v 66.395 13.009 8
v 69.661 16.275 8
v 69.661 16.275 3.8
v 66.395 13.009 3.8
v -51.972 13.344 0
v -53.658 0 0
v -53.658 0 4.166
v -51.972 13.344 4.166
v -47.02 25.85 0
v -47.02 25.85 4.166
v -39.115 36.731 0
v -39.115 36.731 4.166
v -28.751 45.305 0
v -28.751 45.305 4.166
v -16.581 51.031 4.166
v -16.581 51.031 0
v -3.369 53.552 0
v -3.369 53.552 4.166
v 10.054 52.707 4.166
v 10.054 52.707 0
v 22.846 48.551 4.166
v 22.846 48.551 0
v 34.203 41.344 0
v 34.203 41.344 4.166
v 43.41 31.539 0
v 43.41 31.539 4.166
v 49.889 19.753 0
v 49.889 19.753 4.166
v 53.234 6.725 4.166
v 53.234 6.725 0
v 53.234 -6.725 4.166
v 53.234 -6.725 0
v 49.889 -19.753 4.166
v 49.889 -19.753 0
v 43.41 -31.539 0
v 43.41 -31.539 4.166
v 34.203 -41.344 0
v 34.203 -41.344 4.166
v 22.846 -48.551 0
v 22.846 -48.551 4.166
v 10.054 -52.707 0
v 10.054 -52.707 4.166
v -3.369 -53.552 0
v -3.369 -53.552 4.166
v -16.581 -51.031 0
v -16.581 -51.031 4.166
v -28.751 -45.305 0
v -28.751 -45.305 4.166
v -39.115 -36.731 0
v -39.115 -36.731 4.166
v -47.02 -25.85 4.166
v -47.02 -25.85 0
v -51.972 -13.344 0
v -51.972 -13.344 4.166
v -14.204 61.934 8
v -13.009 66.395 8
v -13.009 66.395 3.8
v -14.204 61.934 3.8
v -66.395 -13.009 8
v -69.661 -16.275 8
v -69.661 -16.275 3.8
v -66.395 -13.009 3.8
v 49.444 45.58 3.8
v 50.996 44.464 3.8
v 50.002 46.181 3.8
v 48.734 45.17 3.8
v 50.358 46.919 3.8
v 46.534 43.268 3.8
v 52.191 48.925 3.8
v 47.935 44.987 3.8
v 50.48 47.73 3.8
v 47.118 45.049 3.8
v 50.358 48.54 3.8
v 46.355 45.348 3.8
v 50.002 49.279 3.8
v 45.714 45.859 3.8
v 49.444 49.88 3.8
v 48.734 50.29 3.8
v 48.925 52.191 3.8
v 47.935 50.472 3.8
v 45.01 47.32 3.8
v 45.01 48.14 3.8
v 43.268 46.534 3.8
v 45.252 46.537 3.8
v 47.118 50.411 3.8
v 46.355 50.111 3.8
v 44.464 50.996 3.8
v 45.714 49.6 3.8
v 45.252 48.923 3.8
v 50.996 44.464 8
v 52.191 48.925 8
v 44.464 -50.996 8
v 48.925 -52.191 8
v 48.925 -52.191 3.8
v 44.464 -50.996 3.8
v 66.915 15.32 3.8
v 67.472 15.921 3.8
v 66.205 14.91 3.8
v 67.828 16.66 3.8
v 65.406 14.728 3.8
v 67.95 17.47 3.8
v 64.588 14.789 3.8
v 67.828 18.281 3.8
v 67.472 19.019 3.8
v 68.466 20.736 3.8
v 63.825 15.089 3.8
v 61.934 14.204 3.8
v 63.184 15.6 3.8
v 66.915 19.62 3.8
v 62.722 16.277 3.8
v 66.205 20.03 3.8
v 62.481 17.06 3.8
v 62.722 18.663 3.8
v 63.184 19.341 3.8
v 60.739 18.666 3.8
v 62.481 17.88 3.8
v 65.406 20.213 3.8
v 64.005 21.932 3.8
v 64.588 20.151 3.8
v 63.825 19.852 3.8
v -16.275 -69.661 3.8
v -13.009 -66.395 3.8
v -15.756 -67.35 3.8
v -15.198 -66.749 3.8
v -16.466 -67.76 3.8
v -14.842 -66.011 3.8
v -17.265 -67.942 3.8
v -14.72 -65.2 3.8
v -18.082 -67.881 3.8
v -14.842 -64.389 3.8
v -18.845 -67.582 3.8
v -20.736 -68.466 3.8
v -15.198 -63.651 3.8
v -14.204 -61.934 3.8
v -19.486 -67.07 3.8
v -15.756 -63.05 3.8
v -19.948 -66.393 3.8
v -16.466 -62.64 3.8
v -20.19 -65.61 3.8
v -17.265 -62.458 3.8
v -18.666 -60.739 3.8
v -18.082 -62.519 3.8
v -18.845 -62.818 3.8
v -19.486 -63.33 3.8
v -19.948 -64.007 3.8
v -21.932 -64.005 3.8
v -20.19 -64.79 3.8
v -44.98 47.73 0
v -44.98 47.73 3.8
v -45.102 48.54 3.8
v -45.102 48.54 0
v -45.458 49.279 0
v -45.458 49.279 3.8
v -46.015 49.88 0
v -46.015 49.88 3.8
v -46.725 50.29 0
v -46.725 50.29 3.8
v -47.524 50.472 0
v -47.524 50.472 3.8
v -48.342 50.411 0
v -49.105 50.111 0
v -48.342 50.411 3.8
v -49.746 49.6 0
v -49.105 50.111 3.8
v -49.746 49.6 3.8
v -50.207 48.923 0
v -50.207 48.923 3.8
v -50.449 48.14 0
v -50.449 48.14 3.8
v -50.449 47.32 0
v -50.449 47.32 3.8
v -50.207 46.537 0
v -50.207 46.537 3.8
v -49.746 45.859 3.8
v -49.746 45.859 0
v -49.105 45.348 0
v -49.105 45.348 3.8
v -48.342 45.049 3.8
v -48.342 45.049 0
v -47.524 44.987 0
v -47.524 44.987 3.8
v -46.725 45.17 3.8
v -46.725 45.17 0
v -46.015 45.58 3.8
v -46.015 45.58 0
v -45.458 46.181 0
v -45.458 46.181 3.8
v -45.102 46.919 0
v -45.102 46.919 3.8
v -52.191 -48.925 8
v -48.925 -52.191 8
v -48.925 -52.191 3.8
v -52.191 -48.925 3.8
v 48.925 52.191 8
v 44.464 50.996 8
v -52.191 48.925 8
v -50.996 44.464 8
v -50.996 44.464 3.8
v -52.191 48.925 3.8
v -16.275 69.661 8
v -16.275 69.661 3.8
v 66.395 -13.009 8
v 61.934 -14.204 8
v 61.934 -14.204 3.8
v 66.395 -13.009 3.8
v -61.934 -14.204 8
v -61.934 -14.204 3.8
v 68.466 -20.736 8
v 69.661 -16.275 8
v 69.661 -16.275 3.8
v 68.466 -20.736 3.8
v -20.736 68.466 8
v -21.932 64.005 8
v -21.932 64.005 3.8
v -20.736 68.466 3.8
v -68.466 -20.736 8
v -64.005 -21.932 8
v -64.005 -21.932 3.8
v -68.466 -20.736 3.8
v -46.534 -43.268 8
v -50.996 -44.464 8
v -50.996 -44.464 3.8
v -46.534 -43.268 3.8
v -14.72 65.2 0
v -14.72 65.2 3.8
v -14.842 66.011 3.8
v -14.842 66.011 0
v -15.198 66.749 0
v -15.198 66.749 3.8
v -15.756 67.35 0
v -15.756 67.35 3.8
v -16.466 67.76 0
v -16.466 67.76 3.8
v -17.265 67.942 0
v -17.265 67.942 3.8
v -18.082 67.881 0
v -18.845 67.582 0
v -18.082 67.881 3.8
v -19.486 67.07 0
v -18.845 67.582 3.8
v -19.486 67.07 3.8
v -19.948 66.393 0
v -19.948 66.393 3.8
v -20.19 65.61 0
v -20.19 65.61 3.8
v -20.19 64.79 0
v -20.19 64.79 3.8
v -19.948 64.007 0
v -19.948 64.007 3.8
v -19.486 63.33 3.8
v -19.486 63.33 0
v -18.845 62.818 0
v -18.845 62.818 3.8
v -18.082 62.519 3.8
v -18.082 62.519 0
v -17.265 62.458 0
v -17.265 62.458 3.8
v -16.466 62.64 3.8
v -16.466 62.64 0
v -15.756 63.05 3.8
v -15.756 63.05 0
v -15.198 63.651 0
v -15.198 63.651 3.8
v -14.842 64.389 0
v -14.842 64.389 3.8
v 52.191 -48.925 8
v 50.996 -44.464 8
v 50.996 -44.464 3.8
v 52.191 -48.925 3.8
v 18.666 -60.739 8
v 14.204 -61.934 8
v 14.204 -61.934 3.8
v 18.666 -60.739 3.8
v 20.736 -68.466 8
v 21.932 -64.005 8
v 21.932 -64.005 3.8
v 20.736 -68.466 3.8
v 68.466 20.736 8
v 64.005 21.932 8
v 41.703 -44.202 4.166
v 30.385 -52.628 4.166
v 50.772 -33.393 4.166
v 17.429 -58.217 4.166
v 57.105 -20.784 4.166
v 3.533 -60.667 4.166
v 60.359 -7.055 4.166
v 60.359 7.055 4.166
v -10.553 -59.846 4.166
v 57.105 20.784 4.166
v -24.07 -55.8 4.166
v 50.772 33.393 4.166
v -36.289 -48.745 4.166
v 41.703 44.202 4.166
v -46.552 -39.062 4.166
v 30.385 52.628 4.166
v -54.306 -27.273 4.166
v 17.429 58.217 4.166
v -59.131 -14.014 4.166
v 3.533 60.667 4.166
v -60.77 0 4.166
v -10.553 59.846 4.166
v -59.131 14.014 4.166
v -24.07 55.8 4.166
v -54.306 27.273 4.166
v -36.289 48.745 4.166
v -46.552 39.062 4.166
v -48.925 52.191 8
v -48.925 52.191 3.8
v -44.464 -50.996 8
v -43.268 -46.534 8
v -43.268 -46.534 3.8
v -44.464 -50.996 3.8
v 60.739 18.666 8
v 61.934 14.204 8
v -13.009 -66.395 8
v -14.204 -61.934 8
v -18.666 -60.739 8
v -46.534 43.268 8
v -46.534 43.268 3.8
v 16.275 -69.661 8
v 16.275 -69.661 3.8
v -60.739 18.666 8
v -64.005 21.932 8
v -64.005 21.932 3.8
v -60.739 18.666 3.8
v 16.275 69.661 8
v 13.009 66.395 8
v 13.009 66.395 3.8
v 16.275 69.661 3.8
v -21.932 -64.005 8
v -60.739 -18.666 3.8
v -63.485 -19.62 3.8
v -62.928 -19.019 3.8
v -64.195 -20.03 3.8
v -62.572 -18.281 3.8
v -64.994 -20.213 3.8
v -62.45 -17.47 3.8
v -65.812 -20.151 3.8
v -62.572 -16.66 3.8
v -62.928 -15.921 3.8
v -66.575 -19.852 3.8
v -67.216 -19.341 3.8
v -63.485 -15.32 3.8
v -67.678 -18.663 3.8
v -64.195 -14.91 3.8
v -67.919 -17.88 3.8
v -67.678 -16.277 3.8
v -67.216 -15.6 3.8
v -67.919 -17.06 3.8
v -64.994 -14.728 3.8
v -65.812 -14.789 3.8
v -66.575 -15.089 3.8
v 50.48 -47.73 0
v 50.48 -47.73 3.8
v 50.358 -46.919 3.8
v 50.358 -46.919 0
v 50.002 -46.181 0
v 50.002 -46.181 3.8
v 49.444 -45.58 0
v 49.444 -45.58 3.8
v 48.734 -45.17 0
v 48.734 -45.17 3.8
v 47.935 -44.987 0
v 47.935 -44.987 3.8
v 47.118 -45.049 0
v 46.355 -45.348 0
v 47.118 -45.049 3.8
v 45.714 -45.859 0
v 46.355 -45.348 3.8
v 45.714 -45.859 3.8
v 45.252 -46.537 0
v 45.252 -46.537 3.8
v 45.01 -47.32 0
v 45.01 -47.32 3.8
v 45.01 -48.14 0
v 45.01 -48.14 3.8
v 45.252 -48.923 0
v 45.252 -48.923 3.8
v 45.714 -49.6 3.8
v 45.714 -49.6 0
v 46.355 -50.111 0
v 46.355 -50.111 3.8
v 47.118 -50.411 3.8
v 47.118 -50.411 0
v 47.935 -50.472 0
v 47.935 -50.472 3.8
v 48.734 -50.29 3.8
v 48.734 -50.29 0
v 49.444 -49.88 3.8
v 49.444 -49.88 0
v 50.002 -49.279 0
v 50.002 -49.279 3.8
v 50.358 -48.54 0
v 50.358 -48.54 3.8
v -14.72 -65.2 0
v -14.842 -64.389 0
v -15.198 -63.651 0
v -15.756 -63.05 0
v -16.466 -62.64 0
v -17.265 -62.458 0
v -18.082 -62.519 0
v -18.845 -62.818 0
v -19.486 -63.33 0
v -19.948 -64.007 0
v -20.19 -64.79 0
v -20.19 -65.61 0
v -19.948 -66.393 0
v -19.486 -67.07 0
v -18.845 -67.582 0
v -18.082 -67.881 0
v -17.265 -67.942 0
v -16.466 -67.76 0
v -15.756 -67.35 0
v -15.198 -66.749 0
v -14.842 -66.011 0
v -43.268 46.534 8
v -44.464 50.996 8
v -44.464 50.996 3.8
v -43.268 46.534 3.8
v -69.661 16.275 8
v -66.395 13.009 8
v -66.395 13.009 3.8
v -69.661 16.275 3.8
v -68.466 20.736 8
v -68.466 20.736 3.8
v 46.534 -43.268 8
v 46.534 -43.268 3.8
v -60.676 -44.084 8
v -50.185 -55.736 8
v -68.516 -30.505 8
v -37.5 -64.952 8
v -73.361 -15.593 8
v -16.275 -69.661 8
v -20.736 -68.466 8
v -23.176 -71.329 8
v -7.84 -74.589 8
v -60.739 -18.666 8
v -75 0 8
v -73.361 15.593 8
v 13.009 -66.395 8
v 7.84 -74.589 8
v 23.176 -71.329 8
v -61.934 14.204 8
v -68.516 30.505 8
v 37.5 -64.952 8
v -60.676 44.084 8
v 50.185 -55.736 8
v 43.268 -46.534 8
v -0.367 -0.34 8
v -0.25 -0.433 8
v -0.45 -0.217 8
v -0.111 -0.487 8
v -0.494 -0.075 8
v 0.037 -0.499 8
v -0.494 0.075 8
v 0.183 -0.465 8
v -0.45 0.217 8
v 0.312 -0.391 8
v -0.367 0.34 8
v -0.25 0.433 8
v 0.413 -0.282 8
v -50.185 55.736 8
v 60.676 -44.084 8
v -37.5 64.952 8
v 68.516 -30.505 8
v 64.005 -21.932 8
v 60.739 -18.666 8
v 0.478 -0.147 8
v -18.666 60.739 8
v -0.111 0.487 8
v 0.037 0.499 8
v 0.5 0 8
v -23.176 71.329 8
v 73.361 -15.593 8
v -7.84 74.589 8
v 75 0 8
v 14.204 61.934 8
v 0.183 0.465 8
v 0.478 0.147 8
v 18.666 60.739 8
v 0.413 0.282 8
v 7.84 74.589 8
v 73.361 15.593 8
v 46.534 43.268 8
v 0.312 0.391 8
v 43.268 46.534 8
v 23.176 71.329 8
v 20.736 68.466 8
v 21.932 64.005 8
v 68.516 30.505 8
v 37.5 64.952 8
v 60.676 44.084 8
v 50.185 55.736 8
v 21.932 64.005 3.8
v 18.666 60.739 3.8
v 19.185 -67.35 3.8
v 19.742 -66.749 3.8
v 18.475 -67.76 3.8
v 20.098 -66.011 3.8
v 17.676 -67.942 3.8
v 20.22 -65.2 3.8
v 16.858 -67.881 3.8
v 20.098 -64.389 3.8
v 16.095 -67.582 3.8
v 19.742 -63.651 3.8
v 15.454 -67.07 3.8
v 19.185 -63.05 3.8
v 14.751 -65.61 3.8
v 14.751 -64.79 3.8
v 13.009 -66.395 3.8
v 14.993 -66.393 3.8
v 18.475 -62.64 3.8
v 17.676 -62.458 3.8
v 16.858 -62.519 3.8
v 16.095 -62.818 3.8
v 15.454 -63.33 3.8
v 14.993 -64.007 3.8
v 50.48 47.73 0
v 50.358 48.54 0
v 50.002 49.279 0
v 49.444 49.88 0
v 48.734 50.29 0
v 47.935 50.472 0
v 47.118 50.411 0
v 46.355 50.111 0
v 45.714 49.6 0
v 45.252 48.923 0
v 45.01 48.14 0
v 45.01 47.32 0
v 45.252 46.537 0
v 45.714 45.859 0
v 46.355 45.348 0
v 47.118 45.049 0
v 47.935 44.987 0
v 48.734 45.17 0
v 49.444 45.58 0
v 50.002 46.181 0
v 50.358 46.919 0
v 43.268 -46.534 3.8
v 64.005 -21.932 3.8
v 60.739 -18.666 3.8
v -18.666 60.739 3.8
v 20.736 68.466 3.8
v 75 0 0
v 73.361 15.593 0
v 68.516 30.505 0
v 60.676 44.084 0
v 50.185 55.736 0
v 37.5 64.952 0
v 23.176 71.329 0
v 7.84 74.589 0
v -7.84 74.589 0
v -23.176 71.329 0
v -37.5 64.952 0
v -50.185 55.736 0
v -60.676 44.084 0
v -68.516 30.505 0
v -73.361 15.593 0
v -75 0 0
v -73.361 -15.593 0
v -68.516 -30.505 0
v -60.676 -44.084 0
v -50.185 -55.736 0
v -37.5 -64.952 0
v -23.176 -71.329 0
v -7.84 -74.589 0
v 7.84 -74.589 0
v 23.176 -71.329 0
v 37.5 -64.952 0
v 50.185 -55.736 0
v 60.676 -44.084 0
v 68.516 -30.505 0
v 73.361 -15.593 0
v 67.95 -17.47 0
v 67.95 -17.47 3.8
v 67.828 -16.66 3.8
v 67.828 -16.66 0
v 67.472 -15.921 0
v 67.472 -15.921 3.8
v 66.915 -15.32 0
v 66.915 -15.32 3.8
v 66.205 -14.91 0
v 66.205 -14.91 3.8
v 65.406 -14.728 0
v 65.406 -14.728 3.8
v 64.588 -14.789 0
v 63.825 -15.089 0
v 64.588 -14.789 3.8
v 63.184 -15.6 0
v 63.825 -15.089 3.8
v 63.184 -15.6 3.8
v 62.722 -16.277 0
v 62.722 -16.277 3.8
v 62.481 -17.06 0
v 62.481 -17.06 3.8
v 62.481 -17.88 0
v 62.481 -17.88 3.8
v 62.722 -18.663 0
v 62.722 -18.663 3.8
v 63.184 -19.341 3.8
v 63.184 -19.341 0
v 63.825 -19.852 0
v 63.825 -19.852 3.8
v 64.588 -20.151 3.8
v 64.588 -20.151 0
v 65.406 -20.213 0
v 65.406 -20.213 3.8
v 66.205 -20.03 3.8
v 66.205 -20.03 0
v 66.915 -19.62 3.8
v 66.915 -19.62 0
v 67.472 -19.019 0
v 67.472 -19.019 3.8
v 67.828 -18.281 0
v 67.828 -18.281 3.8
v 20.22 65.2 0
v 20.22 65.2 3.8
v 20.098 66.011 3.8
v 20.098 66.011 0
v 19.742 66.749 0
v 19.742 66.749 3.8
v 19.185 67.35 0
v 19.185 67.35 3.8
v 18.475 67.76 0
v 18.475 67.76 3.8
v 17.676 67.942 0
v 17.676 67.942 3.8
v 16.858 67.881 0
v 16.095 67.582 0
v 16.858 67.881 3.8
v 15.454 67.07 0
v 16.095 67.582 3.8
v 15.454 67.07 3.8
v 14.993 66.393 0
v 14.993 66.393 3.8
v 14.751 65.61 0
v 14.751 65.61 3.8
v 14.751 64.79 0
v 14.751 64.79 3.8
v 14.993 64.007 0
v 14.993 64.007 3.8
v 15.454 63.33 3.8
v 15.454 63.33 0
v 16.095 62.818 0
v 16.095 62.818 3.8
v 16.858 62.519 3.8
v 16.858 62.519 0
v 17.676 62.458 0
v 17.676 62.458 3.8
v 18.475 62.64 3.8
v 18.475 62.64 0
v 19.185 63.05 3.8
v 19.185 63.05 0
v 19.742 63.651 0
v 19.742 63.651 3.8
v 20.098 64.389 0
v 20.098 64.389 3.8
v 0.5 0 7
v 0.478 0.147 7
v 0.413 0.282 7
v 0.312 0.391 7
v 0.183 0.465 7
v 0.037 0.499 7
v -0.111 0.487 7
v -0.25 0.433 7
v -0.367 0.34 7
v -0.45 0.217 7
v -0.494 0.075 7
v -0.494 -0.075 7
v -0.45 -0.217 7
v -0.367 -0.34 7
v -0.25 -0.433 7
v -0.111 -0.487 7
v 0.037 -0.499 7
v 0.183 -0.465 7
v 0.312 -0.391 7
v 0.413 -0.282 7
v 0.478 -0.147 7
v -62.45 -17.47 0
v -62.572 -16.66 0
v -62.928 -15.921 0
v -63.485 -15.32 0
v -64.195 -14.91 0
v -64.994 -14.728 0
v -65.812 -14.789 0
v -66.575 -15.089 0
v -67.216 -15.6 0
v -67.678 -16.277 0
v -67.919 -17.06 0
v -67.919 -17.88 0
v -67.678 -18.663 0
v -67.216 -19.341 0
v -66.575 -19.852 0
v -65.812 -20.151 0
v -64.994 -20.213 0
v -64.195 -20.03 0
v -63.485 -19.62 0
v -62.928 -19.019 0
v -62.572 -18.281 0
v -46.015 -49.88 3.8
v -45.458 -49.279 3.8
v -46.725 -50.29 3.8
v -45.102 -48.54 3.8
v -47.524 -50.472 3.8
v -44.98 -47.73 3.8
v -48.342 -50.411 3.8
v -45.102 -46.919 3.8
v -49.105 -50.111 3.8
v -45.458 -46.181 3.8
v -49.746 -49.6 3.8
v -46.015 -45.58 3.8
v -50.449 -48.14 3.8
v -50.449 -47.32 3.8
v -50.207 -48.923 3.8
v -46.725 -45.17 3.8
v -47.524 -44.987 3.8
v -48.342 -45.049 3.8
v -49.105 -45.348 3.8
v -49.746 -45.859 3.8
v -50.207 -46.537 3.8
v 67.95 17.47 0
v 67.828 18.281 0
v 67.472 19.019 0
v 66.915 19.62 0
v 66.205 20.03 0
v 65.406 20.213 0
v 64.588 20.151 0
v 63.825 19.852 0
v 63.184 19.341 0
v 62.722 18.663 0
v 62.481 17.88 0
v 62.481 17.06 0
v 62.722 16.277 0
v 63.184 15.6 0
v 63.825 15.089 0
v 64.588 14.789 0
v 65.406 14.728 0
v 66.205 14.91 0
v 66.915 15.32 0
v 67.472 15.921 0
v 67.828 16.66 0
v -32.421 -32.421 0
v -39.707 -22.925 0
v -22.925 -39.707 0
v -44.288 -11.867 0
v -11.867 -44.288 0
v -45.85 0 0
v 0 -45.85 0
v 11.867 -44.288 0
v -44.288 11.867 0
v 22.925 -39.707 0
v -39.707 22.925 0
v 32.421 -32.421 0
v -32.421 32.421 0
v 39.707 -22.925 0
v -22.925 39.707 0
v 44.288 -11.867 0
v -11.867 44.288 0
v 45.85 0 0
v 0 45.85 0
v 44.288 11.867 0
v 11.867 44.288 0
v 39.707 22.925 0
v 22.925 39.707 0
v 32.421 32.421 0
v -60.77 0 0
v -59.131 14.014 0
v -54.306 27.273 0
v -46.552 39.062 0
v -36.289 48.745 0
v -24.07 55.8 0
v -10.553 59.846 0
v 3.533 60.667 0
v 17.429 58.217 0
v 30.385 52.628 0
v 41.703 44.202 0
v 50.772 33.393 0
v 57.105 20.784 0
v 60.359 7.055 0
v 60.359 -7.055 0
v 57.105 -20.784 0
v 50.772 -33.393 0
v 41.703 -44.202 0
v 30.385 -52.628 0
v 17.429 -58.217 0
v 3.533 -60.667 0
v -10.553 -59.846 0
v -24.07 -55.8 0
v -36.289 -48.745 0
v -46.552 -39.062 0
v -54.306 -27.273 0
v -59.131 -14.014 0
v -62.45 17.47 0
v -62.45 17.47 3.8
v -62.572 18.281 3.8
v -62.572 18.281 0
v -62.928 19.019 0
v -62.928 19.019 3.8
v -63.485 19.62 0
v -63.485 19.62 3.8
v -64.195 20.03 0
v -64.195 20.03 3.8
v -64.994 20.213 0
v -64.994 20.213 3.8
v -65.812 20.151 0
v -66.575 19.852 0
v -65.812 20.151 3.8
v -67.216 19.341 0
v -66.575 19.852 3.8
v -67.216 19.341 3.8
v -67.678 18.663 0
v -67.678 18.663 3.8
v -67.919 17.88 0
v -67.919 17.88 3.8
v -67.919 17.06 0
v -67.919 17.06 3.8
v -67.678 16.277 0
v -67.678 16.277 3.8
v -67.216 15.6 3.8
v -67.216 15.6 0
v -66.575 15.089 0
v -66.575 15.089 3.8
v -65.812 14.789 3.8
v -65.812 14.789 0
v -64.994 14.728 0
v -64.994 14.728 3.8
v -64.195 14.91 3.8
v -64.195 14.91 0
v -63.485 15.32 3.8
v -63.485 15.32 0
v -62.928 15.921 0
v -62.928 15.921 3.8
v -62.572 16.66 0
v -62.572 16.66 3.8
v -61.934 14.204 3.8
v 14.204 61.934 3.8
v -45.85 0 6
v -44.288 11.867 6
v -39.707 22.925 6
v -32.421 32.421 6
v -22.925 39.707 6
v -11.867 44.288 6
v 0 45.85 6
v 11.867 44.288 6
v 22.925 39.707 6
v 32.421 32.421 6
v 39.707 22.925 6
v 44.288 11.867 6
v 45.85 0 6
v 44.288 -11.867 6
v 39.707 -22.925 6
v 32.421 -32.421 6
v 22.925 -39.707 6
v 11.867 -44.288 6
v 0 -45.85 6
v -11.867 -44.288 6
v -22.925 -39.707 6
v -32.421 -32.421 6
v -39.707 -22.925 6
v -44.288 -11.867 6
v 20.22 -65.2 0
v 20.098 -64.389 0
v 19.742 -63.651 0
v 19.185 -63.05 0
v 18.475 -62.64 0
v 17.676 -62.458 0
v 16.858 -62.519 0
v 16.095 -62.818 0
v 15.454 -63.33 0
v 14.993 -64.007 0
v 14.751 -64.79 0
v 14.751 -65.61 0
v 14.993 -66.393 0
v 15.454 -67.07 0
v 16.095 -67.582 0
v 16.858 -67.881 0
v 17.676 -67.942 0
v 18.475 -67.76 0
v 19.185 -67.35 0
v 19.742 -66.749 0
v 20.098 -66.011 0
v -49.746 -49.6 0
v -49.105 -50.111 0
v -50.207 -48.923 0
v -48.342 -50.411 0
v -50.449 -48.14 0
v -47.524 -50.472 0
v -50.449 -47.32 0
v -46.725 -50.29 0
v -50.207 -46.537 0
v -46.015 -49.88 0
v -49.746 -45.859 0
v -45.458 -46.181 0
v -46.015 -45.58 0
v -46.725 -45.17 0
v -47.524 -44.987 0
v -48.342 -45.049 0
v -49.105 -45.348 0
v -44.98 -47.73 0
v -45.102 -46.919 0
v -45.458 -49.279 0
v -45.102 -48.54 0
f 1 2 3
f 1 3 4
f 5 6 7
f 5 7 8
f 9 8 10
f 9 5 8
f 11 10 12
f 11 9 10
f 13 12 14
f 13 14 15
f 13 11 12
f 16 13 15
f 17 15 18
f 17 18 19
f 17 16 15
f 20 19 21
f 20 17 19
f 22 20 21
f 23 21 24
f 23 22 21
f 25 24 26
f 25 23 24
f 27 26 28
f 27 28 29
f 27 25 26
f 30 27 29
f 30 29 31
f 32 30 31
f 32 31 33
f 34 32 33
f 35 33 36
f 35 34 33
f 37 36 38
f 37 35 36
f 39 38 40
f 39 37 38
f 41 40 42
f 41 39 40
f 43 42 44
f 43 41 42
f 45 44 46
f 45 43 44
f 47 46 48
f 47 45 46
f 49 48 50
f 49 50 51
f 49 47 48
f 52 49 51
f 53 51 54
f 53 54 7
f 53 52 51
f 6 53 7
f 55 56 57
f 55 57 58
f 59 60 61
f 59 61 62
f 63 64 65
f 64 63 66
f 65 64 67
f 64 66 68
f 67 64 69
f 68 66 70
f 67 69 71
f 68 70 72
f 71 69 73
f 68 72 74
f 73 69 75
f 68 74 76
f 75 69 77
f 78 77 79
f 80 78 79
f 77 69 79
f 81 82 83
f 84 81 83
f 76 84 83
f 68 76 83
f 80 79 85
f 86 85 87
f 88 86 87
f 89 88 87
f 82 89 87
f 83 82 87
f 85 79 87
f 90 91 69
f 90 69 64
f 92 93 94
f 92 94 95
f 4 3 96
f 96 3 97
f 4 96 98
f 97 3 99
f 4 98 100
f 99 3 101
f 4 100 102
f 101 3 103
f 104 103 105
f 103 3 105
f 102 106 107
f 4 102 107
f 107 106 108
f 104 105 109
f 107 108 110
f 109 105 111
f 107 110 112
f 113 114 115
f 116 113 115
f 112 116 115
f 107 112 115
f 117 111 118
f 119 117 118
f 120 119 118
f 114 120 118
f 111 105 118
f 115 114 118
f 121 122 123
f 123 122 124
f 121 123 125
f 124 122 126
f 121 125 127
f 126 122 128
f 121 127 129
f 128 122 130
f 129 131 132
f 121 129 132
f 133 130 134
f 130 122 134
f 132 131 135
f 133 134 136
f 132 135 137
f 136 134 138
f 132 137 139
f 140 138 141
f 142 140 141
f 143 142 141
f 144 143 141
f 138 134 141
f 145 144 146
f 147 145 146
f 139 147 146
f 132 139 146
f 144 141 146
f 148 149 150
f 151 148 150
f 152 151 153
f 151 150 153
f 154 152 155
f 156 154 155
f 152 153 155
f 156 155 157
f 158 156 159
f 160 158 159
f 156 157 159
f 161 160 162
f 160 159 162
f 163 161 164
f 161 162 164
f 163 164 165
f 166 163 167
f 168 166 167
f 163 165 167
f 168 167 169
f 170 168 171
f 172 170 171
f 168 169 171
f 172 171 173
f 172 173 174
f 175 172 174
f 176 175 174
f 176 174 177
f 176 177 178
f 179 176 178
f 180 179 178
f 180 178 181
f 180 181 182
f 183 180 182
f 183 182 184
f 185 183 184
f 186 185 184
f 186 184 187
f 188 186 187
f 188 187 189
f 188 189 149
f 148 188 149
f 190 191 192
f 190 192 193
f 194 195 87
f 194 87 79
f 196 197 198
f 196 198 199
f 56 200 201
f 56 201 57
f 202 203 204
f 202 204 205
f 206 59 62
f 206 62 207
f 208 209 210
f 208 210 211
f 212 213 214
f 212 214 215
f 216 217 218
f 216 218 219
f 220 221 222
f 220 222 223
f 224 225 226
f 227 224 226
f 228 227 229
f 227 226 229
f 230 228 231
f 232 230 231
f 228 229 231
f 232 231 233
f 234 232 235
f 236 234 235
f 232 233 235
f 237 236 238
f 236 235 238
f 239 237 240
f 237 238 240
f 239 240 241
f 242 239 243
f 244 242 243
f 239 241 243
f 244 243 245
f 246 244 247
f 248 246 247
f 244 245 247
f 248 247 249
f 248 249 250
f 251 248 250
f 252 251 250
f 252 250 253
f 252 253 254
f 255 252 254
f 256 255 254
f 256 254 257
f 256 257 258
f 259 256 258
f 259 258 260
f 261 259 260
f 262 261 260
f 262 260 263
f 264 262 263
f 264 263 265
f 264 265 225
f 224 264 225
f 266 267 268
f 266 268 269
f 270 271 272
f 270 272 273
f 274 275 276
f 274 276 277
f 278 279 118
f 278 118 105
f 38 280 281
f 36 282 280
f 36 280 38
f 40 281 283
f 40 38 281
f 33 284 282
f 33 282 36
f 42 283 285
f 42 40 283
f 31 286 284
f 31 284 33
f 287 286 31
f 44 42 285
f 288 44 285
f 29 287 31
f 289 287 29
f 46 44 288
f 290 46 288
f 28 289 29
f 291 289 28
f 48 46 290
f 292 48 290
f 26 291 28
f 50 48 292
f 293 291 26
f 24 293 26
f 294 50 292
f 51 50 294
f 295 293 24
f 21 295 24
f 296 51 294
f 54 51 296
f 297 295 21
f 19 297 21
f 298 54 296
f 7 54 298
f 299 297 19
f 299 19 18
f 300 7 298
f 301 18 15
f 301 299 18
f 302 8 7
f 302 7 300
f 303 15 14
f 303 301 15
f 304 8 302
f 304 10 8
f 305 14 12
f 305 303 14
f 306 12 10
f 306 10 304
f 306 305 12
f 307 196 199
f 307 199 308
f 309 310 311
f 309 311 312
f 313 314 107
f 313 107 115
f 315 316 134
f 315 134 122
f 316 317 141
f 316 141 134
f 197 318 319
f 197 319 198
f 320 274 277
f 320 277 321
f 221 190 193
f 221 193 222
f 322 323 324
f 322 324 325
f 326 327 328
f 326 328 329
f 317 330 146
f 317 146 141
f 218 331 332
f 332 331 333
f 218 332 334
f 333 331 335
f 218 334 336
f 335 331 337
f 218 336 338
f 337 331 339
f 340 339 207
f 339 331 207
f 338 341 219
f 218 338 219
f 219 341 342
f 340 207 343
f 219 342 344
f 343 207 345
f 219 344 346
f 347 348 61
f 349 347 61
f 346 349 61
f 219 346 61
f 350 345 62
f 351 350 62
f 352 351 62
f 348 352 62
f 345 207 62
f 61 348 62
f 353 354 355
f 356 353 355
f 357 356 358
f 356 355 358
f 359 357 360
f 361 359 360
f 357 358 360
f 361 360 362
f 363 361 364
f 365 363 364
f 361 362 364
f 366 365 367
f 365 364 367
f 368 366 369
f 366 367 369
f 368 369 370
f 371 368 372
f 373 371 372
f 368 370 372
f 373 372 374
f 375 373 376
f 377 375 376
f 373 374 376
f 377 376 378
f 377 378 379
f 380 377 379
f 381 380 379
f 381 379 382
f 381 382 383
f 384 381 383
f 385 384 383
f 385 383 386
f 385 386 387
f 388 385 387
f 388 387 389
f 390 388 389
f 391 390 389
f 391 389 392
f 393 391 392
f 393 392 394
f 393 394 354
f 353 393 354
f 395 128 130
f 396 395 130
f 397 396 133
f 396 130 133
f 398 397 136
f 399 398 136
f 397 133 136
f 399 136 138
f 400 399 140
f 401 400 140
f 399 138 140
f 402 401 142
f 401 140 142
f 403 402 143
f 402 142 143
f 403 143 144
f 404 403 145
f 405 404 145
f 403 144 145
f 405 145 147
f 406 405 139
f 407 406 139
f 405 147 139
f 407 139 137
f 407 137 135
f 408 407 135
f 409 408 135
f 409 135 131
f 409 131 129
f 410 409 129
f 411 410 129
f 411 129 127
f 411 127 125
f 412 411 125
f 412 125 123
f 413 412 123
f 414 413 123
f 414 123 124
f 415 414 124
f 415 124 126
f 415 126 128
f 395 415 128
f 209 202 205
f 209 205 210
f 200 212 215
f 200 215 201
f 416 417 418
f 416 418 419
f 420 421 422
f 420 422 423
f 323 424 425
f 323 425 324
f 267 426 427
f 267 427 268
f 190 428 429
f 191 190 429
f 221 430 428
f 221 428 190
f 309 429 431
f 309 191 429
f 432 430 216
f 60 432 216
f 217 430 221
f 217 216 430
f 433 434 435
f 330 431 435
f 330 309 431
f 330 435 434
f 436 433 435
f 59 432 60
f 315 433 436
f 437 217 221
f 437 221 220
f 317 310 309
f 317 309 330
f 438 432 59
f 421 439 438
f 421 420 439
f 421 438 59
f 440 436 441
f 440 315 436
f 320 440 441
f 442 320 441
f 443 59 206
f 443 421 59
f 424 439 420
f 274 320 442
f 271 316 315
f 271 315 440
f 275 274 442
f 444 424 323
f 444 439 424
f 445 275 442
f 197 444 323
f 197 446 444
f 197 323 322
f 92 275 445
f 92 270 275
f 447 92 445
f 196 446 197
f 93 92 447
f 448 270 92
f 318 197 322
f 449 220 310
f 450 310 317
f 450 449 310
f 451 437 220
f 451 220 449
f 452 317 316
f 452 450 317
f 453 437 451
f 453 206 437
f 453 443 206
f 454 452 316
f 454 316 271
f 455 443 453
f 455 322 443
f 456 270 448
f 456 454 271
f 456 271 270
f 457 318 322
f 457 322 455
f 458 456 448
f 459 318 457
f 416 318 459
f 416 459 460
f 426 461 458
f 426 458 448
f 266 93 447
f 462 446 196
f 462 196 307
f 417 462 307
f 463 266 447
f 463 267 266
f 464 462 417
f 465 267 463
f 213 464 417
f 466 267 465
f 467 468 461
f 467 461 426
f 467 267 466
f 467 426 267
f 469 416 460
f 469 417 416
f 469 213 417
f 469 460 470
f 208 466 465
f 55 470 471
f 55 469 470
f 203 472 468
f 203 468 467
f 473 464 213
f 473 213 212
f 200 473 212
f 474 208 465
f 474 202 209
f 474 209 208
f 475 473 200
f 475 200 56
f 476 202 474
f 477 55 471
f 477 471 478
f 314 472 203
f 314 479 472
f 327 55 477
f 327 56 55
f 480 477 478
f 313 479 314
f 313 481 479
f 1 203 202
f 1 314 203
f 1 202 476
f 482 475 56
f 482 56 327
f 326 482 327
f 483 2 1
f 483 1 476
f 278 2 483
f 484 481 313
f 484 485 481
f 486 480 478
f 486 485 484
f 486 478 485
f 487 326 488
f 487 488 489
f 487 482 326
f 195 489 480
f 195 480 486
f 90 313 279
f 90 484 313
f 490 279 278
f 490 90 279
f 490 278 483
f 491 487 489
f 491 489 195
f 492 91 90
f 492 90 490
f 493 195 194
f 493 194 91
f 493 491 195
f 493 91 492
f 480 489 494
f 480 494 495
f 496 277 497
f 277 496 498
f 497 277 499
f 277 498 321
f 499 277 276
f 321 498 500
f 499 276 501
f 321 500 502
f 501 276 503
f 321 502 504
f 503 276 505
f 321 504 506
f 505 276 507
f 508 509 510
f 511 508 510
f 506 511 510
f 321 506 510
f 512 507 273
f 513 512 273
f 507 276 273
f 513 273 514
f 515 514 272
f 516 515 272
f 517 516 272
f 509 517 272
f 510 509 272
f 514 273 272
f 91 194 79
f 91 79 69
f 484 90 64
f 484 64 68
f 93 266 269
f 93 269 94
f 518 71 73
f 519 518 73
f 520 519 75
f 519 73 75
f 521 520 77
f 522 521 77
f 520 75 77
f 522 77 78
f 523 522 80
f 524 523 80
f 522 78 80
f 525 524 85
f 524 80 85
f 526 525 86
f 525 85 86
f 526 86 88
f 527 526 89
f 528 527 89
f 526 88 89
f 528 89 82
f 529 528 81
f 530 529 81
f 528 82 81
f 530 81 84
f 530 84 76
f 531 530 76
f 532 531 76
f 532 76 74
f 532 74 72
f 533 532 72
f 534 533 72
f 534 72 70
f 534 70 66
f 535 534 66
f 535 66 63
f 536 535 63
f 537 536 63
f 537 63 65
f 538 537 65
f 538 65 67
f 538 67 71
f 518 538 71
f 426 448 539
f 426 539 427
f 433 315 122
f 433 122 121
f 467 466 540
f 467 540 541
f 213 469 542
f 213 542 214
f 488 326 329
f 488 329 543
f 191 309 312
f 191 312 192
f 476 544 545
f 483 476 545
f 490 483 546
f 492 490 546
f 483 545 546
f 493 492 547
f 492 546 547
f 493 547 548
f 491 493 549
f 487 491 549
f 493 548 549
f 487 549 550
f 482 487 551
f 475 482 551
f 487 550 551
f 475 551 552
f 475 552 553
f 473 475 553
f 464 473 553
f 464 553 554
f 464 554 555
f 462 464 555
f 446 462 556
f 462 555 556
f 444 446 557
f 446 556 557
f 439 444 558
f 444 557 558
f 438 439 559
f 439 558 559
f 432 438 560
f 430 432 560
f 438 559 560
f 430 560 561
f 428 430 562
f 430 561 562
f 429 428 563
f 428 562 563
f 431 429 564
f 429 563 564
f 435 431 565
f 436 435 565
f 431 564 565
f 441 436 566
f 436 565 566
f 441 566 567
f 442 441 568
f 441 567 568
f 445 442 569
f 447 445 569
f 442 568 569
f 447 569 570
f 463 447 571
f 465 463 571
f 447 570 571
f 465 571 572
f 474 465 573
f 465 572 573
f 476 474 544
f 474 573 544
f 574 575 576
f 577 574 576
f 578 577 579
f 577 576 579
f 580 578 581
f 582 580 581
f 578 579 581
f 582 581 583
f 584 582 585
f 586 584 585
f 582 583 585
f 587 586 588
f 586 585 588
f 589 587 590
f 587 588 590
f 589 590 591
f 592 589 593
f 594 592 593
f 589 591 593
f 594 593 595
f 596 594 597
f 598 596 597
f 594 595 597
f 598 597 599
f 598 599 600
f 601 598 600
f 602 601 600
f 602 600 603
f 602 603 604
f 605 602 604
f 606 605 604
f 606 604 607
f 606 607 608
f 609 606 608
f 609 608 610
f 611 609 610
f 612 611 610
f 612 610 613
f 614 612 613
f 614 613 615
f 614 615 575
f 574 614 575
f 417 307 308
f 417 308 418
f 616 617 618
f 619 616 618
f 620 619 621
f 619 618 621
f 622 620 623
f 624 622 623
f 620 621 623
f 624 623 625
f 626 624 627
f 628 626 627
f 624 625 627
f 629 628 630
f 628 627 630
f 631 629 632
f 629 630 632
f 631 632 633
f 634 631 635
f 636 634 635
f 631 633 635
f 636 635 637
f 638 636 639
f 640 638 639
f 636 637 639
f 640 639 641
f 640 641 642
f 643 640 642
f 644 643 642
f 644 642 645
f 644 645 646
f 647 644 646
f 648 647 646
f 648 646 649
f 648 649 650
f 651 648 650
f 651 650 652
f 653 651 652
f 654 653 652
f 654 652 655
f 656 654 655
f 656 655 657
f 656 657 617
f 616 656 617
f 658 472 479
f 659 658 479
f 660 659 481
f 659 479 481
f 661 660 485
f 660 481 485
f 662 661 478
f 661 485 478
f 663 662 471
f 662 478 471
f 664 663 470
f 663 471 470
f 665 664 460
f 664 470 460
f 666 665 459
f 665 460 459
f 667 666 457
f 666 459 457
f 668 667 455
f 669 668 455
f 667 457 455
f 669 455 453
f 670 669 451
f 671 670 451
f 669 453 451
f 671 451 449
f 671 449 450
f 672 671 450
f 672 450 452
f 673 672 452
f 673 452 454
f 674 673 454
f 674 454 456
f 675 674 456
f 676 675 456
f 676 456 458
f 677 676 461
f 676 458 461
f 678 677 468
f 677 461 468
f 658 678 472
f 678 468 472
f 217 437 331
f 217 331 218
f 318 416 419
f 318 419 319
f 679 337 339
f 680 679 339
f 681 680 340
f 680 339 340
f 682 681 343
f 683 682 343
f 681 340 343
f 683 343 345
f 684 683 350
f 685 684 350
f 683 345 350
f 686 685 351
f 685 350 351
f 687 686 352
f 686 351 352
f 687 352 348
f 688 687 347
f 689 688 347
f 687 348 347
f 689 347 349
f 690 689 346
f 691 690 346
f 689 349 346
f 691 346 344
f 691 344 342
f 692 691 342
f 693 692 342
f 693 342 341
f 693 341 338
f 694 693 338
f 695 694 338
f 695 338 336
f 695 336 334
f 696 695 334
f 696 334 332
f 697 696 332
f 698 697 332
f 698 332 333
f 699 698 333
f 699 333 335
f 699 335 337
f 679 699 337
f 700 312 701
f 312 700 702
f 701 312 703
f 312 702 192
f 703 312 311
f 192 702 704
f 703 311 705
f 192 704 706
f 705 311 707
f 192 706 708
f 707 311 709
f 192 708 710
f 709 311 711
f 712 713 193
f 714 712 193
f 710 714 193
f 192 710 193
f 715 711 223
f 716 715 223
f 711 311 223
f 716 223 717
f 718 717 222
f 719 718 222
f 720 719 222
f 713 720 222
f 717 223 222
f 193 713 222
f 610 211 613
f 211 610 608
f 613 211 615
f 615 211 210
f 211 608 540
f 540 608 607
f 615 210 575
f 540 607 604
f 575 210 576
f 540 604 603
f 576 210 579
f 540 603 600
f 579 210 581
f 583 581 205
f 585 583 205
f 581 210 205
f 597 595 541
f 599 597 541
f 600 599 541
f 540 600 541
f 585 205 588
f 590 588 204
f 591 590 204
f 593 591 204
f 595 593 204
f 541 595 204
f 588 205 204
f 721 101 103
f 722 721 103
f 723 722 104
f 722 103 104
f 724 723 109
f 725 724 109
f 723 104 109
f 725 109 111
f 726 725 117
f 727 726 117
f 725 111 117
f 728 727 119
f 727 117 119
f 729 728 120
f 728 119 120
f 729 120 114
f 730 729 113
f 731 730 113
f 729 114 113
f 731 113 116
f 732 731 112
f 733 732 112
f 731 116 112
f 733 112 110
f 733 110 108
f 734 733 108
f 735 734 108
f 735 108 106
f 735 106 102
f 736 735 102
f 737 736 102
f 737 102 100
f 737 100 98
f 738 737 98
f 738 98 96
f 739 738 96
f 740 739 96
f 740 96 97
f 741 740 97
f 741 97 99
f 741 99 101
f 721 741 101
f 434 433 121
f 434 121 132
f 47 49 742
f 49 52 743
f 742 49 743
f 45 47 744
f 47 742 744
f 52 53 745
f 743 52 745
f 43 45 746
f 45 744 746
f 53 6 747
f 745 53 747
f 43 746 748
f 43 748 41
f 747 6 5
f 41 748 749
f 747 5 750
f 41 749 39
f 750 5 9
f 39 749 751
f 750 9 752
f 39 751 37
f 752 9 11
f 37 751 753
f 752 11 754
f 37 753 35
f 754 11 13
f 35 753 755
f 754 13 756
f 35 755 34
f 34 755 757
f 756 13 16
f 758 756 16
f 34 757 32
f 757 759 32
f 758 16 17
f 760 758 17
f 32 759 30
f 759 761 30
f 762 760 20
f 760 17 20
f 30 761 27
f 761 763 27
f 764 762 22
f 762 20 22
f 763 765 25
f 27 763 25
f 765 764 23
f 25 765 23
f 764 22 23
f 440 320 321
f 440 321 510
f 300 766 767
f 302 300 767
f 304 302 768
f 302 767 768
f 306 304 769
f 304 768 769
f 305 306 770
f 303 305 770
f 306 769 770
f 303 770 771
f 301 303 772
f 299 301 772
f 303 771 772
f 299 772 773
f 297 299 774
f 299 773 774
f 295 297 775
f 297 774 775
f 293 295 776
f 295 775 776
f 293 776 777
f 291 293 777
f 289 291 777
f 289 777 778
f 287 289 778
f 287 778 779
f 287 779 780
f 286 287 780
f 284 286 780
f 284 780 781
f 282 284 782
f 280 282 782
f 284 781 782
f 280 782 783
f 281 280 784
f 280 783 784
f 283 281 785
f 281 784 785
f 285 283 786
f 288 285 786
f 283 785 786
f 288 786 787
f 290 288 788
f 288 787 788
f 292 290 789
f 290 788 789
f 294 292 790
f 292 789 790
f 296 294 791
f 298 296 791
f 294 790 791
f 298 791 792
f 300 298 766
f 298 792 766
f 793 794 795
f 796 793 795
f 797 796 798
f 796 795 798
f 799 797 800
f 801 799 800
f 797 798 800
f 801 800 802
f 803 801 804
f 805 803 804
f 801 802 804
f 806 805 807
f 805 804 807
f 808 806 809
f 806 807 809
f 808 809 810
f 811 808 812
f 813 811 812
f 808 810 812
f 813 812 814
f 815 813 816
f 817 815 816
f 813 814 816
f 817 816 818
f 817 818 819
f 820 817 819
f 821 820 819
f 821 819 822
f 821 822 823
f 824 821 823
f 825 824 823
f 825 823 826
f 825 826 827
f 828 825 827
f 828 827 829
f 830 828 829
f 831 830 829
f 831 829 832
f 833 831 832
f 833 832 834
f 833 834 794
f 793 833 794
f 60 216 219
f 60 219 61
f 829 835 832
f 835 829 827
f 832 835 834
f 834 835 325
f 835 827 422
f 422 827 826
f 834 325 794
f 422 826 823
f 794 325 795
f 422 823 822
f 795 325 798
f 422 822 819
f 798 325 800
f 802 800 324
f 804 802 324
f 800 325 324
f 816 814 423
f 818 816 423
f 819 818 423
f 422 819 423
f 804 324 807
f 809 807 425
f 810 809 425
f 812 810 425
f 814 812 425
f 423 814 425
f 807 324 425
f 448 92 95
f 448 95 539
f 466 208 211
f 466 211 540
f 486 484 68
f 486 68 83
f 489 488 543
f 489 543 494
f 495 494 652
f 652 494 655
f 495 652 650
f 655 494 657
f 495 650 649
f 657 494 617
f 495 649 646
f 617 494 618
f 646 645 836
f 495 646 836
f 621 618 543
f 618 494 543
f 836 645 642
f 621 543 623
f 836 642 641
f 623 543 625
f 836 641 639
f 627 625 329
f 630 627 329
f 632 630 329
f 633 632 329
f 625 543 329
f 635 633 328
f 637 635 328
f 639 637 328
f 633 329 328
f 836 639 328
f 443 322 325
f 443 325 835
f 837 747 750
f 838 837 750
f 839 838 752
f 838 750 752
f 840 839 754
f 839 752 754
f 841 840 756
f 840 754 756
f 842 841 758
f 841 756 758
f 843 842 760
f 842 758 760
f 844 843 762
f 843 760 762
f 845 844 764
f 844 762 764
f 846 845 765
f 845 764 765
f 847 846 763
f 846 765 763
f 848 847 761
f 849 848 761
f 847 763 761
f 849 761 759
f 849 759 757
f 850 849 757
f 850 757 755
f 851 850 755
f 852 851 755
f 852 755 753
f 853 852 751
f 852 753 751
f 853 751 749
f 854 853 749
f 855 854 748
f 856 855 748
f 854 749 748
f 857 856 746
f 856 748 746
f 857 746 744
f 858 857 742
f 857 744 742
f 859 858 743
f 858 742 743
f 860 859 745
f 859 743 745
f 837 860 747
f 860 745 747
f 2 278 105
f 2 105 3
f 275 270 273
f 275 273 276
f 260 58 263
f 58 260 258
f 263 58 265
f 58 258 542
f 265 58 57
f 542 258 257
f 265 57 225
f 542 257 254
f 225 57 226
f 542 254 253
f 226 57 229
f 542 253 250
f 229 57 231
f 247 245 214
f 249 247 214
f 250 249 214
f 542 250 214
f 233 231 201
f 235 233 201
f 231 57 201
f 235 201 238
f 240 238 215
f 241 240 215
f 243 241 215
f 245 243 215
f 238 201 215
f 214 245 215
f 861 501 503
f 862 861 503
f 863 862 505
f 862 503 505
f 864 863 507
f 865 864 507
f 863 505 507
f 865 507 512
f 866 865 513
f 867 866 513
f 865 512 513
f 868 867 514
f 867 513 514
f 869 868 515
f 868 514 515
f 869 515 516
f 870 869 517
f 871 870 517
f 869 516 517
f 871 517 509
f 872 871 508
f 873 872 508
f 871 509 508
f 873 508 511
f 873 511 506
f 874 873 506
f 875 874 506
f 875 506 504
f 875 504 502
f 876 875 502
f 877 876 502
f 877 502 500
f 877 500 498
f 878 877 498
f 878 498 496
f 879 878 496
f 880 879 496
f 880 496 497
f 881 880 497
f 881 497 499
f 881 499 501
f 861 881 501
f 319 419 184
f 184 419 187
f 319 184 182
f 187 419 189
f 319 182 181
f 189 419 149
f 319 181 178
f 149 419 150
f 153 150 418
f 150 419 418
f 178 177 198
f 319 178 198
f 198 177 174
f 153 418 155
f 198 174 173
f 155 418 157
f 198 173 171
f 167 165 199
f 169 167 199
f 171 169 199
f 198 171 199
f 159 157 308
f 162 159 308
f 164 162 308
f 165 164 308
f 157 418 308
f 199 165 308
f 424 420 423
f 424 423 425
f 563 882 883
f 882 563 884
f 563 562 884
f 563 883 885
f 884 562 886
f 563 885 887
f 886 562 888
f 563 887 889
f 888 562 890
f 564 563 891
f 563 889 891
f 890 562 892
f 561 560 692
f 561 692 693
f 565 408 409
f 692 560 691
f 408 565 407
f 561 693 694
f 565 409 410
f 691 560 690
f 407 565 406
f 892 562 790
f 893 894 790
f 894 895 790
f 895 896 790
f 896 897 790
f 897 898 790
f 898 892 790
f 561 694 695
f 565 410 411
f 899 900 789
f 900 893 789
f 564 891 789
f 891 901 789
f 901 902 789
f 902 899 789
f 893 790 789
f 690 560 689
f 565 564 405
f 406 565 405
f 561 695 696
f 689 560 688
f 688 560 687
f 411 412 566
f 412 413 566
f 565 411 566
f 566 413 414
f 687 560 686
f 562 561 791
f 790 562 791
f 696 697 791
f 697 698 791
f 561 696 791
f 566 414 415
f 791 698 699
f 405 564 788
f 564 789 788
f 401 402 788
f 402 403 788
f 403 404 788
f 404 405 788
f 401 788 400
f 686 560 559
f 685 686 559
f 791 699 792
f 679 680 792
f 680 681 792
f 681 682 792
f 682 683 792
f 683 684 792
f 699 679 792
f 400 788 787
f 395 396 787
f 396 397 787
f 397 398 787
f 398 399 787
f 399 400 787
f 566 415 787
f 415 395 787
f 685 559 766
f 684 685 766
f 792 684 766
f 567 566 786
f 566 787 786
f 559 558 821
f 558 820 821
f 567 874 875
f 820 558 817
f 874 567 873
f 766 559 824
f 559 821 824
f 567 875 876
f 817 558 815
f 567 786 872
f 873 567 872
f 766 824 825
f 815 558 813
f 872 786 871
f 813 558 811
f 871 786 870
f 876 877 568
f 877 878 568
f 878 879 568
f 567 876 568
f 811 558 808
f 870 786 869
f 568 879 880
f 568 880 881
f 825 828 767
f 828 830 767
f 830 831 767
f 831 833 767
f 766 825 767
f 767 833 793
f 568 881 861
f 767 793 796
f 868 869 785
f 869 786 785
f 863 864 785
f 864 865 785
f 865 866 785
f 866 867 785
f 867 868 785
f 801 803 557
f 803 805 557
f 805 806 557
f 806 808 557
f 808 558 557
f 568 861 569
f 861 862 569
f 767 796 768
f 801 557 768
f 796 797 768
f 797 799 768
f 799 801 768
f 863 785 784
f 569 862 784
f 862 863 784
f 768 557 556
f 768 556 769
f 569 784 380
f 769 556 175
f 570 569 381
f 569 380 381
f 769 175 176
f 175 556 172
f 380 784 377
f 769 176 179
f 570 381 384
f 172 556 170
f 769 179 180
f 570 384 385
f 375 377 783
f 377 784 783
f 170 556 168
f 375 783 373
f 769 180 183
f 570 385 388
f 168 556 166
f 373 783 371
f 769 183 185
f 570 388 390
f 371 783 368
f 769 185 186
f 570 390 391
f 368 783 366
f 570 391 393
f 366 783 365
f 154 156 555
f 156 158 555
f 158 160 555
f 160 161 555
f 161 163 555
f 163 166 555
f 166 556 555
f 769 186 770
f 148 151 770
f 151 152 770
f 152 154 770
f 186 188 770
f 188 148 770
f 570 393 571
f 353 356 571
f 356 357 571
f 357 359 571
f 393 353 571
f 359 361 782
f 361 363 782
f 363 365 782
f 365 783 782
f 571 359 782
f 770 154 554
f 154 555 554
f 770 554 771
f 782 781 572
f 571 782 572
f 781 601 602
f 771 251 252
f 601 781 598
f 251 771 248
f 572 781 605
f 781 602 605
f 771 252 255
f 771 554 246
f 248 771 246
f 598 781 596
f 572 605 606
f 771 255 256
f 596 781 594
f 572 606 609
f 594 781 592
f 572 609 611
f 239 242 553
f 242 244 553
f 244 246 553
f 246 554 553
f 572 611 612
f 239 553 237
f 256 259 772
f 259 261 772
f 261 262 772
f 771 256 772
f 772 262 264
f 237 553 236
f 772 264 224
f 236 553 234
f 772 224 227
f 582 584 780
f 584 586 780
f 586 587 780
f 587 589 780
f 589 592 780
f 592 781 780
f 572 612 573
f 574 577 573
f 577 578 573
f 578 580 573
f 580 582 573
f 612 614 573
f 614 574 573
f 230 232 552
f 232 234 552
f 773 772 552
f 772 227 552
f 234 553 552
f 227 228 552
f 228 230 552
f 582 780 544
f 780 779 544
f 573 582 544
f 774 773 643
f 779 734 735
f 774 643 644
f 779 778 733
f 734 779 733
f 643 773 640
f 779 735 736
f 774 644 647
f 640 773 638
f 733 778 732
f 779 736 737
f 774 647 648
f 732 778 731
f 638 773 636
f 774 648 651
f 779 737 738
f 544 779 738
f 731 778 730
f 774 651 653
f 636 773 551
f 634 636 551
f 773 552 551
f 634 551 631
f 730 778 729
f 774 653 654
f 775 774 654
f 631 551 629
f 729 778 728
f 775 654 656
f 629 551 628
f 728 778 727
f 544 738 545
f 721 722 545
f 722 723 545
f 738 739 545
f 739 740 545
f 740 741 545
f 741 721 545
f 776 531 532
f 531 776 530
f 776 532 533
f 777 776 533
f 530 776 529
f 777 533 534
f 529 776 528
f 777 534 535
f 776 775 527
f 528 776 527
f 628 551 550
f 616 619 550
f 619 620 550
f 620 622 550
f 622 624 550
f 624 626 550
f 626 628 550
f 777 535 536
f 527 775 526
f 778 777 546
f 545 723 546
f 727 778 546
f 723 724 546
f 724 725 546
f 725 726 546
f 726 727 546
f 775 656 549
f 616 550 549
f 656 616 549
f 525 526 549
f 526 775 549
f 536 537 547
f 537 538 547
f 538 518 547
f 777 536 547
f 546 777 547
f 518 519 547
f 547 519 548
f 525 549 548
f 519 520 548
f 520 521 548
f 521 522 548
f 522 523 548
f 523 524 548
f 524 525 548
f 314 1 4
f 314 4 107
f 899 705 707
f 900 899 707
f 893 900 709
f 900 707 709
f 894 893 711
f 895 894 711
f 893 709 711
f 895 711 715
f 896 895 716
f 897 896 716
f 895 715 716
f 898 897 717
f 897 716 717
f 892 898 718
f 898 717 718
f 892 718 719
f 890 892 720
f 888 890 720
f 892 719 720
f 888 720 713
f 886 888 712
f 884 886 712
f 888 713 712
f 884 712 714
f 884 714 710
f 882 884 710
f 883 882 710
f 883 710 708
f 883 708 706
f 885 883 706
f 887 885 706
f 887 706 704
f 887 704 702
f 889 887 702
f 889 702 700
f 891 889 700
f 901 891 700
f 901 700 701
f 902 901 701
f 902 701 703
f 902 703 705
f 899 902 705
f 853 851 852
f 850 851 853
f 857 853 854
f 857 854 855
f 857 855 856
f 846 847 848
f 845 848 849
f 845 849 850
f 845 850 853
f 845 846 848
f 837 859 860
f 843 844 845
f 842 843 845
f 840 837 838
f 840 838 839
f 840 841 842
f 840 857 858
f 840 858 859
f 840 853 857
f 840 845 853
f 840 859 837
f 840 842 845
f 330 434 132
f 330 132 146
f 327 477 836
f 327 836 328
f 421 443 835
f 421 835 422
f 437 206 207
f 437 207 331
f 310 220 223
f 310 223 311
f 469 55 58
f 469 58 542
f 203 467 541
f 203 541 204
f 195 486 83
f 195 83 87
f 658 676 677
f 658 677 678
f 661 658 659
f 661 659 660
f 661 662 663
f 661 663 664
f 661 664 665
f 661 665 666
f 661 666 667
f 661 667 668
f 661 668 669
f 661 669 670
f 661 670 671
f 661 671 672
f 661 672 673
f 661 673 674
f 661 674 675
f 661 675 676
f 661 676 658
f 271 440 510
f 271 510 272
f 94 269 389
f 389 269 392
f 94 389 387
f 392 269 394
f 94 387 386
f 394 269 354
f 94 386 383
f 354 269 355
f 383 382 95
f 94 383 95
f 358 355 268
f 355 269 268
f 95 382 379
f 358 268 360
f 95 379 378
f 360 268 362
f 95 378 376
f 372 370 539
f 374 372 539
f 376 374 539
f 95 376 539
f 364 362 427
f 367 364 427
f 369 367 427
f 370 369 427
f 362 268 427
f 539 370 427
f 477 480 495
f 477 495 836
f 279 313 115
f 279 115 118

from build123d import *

# Parameters (mm, degrees)
SKETCH1_R            = 75
BOSS_EXTRUDE1_DEPTH  = 8
M5_CLEARANCE_HOLE1_D = 5.5
CUT_EXTRUDE2_DEPTH   = 4.2
SKETCH11_R           = 45.85
CUT_EXTRUDE3_DEPTH   = 6
SKETCH12_R           = 60.7695
SKETCH12_R_2         = 53.6575
CUT_EXTRUDE4_DEPTH   = 4.1656
SKETCH14_R           = 0.5
CENTER_HOLE_DEPTH    = 1


with BuildPart() as part:
    # Sketch1 → Boss-Extrude1 (new body)
    with BuildSketch(Plane.XY):
        Circle(SKETCH1_R)
    extrude(amount=BOSS_EXTRUDE1_DEPTH)

    # M5 Clearance Hole1 (through all)
    with Locations(Plane(origin=(0, 0, 0), x_dir=(-1, 0, 0), z_dir=(0, 0, -1))):
        with Locations((-17.470285544, -65.199993275), (-47.72970773, 47.72970773), (65.199993275, -17.470285544), (47.72970773, -47.72970773), (-65.199993275, 17.470285544), (-17.470285544, 65.199993275), (-65.199993275, -17.470285544), (-47.72970773, -47.72970773), (17.470285544, -65.199993275), (65.199993275, 17.470285544), (47.72970773, 47.72970773), (17.470285544, 65.199993275)):
            Hole(M5_CLEARANCE_HOLE1_D / 2)

    # Sketch6 → Cut-Extrude2 (cut)
    with BuildSketch(Plane(origin=(0, 0, 8), x_dir=(-1, 0, 0), z_dir=(0, 0, -1))):
        Polygon((-43.268287443, 46.534273767), (-44.463721406, 50.995694054), (-48.925141693, 52.191128017), (-52.191128017, 48.925141693), (-50.995694054, 44.463721406), (-46.534273767, 43.268287443), align=None)
        Polygon((-13.008865258, 66.395427237), (-16.274851582, 69.661413561), (-20.736271868, 68.465979598), (-21.931705831, 64.004559312), (-18.665719507, 60.738572988), (-14.204299221, 61.934006951), align=None)
        Polygon((21.931705831, 64.004559312), (20.736271868, 68.465979598), (16.274851582, 69.661413561), (13.008865258, 66.395427237), (14.204299221, 61.934006951), (18.665719507, 60.738572988), align=None)
        Polygon((50.995694054, 44.463721406), (52.191128017, 48.925141693), (48.925141693, 52.191128017), (44.463721406, 50.995694054), (43.268287443, 46.534273767), (46.534273767, 43.268287444), align=None)
        Polygon((66.395427237, 13.008865258), (69.661413561, 16.274851582), (68.465979598, 20.736271868), (64.004559312, 21.931705831), (60.738572988, 18.665719507), (61.934006951, 14.204299221), align=None)
        Polygon((64.004559312, -21.931705831), (68.465979598, -20.736271868), (69.661413561, -16.274851582), (66.395427237, -13.008865258), (61.934006951, -14.204299221), (60.738572988, -18.665719507), align=None)
        Polygon((44.463721406, -50.995694054), (48.925141693, -52.191128017), (52.191128017, -48.925141693), (50.995694054, -44.463721406), (46.534273767, -43.268287443), (43.268287444, -46.534273767), align=None)
        Polygon((13.008865258, -66.395427237), (16.274851582, -69.661413561), (20.736271868, -68.465979598), (21.931705831, -64.004559312), (18.665719507, -60.738572988), (14.204299221, -61.934006951), align=None)
        Polygon((-21.931705831, -64.004559312), (-20.736271868, -68.465979598), (-16.274851582, -69.661413561), (-13.008865258, -66.395427237), (-14.204299221, -61.934006951), (-18.665719507, -60.738572988), align=None)
        Polygon((-50.995694054, -44.463721406), (-52.191128017, -48.925141693), (-48.925141693, -52.191128017), (-44.463721406, -50.995694054), (-43.268287443, -46.534273767), (-46.534273767, -43.268287443), align=None)
        Polygon((-66.395427237, -13.008865258), (-69.661413561, -16.274851582), (-68.465979598, -20.736271868), (-64.004559312, -21.931705831), (-60.738572988, -18.665719507), (-61.934006951, -14.204299221), align=None)
        Polygon((-64.004559312, 21.931705831), (-68.465979598, 20.736271868), (-69.661413561, 16.274851582), (-66.395427237, 13.008865258), (-61.934006951, 14.204299221), (-60.738572988, 18.665719507), align=None)
    extrude(amount=CUT_EXTRUDE2_DEPTH, mode=Mode.SUBTRACT)

    # Sketch11 → Cut-Extrude3 (cut)
    with BuildSketch(Plane(origin=(0, 0, 0), x_dir=(-1, 0, 0), z_dir=(0, 0, -1))):
        Circle(SKETCH11_R)
    extrude(amount=-CUT_EXTRUDE3_DEPTH, mode=Mode.SUBTRACT)

    # Sketch12 → Cut-Extrude4 (cut)
    with BuildSketch(Plane(origin=(0, 0, 0), x_dir=(-1, 0, 0), z_dir=(0, 0, -1))):
        Circle(SKETCH12_R)
        Circle(SKETCH12_R_2, mode=Mode.SUBTRACT)
    extrude(amount=-CUT_EXTRUDE4_DEPTH, mode=Mode.SUBTRACT)

    # Sketch14 → center hole (cut)
    with BuildSketch(Plane.XY.offset(8)):
        Circle(SKETCH14_R)
    extrude(amount=-CENTER_HOLE_DEPTH, mode=Mode.SUBTRACT)


solid = part.part
